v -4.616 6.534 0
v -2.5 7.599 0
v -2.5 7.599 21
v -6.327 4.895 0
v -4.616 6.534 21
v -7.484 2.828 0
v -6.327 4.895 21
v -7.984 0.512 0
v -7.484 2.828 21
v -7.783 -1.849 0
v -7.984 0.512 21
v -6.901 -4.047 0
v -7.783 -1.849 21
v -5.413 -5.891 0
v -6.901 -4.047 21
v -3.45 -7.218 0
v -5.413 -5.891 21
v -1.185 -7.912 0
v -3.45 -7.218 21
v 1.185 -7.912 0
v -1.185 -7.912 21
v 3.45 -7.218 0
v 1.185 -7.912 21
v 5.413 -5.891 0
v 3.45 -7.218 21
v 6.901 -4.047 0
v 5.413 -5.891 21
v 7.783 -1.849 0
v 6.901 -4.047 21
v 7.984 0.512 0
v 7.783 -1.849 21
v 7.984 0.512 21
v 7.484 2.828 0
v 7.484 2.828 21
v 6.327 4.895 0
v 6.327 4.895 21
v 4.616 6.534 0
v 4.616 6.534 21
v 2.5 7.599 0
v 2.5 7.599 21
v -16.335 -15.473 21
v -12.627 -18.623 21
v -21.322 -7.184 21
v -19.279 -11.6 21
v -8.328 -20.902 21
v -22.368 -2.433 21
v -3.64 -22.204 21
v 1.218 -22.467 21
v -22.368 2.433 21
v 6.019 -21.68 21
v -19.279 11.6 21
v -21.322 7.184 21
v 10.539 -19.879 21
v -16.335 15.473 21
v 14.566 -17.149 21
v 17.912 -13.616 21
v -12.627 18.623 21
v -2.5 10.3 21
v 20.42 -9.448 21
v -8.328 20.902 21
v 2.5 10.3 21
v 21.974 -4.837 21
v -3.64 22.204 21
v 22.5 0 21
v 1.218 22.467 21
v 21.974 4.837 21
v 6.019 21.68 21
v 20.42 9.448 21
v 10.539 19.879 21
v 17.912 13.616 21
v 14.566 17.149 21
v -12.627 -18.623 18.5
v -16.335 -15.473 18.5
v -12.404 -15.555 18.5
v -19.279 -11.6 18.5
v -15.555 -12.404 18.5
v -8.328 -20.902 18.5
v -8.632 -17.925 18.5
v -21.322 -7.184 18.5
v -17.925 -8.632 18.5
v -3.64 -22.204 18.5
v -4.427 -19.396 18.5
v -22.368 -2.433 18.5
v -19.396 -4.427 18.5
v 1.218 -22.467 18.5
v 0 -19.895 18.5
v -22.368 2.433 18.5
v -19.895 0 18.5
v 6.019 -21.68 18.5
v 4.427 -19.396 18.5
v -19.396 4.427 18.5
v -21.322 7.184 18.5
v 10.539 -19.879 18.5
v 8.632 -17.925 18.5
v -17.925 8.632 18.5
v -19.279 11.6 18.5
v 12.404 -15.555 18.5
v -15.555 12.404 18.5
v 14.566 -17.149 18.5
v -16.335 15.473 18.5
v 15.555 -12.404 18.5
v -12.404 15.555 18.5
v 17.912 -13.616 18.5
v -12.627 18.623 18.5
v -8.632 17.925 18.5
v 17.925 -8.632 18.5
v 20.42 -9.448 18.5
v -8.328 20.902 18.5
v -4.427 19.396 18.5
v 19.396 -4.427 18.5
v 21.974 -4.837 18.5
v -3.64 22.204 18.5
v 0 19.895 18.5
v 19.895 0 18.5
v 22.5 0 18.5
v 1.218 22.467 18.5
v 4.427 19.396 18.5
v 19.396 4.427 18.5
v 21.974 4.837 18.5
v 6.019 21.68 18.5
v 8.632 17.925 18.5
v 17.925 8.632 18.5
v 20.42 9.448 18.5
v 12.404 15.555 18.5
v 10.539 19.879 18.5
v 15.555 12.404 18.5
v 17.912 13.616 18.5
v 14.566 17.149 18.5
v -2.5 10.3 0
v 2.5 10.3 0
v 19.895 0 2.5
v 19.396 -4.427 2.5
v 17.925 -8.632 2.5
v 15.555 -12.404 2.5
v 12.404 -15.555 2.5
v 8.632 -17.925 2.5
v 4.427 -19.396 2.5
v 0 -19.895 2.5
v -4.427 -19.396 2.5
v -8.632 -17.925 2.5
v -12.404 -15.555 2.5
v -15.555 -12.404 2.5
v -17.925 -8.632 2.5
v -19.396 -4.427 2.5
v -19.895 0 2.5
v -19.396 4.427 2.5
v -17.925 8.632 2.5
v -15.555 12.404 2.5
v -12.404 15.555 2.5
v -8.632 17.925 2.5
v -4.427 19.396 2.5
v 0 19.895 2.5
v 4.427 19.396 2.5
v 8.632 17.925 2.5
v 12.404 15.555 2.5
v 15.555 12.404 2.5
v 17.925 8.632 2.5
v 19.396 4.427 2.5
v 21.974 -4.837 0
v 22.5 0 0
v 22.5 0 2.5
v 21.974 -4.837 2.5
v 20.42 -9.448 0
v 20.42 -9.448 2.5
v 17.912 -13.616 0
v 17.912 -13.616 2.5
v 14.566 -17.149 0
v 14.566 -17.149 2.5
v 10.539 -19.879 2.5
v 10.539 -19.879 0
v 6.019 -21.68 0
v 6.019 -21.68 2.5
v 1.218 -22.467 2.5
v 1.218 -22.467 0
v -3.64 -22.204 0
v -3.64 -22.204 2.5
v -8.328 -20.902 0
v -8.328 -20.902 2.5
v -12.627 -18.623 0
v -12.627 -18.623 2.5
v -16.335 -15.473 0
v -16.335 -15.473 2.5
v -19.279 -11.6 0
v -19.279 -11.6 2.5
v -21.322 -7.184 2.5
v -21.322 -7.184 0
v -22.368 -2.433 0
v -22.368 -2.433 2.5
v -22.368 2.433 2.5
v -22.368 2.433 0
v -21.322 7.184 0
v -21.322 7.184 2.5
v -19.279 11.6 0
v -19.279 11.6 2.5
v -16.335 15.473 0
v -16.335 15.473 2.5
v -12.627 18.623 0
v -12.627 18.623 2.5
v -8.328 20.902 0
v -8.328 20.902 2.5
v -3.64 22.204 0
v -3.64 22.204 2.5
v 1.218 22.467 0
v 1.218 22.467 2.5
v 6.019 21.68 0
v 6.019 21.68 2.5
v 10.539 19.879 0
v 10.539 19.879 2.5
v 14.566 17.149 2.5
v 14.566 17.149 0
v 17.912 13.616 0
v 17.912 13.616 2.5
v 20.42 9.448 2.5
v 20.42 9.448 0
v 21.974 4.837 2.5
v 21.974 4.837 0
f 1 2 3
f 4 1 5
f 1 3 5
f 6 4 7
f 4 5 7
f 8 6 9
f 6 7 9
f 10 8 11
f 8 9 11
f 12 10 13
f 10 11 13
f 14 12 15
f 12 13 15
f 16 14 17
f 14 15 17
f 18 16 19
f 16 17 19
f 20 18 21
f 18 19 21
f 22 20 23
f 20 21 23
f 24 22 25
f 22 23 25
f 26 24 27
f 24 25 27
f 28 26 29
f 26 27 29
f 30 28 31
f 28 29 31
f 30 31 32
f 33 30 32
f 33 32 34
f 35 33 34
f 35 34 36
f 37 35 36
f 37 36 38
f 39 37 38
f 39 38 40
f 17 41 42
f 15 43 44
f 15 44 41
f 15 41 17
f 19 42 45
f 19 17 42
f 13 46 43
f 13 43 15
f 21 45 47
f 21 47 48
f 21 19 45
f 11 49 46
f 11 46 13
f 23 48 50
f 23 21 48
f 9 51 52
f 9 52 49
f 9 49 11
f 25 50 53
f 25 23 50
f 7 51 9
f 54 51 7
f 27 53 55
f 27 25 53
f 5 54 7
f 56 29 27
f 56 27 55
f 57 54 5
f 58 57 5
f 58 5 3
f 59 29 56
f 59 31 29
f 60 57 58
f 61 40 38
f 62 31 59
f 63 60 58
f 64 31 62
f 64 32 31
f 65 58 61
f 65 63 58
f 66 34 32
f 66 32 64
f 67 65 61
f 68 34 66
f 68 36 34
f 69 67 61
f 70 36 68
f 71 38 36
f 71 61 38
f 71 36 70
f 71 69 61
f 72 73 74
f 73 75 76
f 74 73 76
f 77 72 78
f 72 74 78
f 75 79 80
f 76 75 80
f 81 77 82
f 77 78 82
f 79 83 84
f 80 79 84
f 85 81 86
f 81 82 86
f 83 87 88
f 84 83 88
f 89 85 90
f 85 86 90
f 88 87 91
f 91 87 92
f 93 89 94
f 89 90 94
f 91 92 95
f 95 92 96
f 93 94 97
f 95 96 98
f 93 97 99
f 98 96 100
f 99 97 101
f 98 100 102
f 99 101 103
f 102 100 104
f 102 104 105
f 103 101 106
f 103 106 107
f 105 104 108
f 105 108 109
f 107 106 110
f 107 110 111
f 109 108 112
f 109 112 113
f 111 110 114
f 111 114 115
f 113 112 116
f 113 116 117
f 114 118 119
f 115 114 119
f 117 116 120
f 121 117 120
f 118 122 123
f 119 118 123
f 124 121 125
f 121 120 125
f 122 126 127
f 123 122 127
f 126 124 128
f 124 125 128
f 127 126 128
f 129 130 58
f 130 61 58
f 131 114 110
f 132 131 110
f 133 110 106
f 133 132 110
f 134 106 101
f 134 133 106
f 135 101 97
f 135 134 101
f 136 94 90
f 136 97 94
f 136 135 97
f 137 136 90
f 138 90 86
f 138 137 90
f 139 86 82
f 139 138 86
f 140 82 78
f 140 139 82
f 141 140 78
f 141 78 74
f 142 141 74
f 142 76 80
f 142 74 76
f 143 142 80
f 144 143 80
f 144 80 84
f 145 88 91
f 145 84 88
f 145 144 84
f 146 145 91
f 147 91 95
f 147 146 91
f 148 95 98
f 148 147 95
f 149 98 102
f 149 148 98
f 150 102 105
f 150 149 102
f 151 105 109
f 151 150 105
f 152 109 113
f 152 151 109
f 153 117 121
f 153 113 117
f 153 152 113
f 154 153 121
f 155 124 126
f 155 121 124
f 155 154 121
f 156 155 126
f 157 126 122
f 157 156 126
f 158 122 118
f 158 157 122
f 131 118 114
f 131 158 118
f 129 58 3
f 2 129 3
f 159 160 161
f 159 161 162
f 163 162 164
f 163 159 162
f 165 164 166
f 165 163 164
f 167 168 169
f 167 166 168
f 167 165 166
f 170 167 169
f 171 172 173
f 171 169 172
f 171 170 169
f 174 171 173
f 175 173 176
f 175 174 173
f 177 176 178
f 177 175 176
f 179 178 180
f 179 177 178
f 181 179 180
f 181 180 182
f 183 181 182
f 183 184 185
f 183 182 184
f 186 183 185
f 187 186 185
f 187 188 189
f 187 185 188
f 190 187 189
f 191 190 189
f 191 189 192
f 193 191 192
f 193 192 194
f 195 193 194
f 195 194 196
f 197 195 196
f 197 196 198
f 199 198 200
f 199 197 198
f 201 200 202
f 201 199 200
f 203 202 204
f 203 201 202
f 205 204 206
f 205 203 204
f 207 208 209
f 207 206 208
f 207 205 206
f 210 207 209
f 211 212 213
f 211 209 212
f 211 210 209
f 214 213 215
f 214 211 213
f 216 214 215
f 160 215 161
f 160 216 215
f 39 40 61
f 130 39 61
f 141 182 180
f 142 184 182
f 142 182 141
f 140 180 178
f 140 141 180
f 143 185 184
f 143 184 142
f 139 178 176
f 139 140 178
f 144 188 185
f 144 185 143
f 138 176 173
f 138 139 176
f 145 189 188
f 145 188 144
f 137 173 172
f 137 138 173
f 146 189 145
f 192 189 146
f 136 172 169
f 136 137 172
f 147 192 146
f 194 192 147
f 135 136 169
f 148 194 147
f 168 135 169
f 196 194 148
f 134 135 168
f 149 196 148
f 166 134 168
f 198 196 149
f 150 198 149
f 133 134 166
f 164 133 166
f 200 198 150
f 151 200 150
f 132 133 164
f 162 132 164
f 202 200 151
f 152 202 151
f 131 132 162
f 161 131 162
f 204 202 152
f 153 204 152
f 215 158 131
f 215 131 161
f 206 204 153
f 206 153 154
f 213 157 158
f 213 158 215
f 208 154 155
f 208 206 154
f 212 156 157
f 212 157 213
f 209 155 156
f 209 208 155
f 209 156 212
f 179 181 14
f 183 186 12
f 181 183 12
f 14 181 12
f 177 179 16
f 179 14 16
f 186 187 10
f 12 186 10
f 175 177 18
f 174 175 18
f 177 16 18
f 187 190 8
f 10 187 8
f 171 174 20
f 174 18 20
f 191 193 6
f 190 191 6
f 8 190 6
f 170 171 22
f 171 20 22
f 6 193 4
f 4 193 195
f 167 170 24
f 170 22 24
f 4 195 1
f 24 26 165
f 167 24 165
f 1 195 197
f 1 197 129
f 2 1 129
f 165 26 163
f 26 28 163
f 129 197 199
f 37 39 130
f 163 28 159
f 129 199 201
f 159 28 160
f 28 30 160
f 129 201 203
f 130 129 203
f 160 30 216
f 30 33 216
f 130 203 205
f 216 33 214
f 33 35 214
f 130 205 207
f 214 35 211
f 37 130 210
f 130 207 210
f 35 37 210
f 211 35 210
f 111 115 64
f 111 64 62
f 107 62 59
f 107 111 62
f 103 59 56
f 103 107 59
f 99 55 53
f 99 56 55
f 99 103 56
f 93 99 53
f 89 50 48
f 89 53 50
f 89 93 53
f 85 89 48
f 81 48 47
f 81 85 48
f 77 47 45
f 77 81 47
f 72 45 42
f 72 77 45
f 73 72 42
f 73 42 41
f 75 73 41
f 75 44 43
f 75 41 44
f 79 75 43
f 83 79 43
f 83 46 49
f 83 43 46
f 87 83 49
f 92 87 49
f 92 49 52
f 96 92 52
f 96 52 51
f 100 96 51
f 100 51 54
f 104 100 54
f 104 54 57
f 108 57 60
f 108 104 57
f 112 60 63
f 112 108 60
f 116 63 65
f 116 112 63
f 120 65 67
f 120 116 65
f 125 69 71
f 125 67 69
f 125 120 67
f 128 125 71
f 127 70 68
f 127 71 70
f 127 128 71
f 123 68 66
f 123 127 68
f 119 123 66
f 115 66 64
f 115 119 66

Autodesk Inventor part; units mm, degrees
ref_plane "YZ Plane" through (0, 0, 0) normal (1, 0, 0) x (0, 1, 0)
ref_plane "XZ Plane" through (0, 0, 0) normal (0, 1, 0) x (-1, 0, 0)
ref_plane "XY Plane" through (0, 0, 0) normal (0, 0, 1) x (1, 0, 0)
sketch "Sketch1" plane through (0, 0, 0) normal (0, 0, 1) x (1, 0, 0)
  circle A0 centre (0, 0) radius 22.5
  dimension "d0" = 45
extrude "Extrusion1" add sketch "Sketch1" along normal blind 2.5
sketch "Sketch2" plane through (0, 0, 2.5) normal (0, 0, 1) x (1, 0, 0)
  circle A0 centre (0, 0) radius 19.895
  dimension "d3" = 39.79
extrude "Extrusion2" add sketch "Sketch2" along normal blind 16
sketch "Sketch3" plane through (0, 0, 18.5) normal (0, 0, 1) x (1, 0, 0)
  circle A0 centre (0, 0) radius 22.5
  dimension "d6" = 45
extrude "Extrusion3" add sketch "Sketch3" along normal blind 2.5
sketch "Sketch4" plane through (0, 0, 21) normal (0, 0, 1) x (1, 0, 0)
  circle A0 centre (0, 0) radius 8
  line L0 (-2.5, 5.7) -> (2.5, 5.7)
  line L1 (2.5, 5.7) -> (2.5, 10.3)
  line L2 (2.5, 10.3) -> (-2.5, 10.3)
  line L3 (-2.5, 10.3) -> (-2.5, 5.7)
  line L4 (-2.5, 5.7) -> (2.5, 10.3) construction
  line L5 (2.5, 5.7) -> (-2.5, 10.3) construction
  point P0 (0, 8)
  dimension "d9" = 16
  dimension "d10" = 5
  dimension "d11" = 4.6
extrude "Extrusion4" cut sketch "Sketch4" against normal blind 21
properties part number "HTD5M 25 Pulley" material "Aluminum 6061"
